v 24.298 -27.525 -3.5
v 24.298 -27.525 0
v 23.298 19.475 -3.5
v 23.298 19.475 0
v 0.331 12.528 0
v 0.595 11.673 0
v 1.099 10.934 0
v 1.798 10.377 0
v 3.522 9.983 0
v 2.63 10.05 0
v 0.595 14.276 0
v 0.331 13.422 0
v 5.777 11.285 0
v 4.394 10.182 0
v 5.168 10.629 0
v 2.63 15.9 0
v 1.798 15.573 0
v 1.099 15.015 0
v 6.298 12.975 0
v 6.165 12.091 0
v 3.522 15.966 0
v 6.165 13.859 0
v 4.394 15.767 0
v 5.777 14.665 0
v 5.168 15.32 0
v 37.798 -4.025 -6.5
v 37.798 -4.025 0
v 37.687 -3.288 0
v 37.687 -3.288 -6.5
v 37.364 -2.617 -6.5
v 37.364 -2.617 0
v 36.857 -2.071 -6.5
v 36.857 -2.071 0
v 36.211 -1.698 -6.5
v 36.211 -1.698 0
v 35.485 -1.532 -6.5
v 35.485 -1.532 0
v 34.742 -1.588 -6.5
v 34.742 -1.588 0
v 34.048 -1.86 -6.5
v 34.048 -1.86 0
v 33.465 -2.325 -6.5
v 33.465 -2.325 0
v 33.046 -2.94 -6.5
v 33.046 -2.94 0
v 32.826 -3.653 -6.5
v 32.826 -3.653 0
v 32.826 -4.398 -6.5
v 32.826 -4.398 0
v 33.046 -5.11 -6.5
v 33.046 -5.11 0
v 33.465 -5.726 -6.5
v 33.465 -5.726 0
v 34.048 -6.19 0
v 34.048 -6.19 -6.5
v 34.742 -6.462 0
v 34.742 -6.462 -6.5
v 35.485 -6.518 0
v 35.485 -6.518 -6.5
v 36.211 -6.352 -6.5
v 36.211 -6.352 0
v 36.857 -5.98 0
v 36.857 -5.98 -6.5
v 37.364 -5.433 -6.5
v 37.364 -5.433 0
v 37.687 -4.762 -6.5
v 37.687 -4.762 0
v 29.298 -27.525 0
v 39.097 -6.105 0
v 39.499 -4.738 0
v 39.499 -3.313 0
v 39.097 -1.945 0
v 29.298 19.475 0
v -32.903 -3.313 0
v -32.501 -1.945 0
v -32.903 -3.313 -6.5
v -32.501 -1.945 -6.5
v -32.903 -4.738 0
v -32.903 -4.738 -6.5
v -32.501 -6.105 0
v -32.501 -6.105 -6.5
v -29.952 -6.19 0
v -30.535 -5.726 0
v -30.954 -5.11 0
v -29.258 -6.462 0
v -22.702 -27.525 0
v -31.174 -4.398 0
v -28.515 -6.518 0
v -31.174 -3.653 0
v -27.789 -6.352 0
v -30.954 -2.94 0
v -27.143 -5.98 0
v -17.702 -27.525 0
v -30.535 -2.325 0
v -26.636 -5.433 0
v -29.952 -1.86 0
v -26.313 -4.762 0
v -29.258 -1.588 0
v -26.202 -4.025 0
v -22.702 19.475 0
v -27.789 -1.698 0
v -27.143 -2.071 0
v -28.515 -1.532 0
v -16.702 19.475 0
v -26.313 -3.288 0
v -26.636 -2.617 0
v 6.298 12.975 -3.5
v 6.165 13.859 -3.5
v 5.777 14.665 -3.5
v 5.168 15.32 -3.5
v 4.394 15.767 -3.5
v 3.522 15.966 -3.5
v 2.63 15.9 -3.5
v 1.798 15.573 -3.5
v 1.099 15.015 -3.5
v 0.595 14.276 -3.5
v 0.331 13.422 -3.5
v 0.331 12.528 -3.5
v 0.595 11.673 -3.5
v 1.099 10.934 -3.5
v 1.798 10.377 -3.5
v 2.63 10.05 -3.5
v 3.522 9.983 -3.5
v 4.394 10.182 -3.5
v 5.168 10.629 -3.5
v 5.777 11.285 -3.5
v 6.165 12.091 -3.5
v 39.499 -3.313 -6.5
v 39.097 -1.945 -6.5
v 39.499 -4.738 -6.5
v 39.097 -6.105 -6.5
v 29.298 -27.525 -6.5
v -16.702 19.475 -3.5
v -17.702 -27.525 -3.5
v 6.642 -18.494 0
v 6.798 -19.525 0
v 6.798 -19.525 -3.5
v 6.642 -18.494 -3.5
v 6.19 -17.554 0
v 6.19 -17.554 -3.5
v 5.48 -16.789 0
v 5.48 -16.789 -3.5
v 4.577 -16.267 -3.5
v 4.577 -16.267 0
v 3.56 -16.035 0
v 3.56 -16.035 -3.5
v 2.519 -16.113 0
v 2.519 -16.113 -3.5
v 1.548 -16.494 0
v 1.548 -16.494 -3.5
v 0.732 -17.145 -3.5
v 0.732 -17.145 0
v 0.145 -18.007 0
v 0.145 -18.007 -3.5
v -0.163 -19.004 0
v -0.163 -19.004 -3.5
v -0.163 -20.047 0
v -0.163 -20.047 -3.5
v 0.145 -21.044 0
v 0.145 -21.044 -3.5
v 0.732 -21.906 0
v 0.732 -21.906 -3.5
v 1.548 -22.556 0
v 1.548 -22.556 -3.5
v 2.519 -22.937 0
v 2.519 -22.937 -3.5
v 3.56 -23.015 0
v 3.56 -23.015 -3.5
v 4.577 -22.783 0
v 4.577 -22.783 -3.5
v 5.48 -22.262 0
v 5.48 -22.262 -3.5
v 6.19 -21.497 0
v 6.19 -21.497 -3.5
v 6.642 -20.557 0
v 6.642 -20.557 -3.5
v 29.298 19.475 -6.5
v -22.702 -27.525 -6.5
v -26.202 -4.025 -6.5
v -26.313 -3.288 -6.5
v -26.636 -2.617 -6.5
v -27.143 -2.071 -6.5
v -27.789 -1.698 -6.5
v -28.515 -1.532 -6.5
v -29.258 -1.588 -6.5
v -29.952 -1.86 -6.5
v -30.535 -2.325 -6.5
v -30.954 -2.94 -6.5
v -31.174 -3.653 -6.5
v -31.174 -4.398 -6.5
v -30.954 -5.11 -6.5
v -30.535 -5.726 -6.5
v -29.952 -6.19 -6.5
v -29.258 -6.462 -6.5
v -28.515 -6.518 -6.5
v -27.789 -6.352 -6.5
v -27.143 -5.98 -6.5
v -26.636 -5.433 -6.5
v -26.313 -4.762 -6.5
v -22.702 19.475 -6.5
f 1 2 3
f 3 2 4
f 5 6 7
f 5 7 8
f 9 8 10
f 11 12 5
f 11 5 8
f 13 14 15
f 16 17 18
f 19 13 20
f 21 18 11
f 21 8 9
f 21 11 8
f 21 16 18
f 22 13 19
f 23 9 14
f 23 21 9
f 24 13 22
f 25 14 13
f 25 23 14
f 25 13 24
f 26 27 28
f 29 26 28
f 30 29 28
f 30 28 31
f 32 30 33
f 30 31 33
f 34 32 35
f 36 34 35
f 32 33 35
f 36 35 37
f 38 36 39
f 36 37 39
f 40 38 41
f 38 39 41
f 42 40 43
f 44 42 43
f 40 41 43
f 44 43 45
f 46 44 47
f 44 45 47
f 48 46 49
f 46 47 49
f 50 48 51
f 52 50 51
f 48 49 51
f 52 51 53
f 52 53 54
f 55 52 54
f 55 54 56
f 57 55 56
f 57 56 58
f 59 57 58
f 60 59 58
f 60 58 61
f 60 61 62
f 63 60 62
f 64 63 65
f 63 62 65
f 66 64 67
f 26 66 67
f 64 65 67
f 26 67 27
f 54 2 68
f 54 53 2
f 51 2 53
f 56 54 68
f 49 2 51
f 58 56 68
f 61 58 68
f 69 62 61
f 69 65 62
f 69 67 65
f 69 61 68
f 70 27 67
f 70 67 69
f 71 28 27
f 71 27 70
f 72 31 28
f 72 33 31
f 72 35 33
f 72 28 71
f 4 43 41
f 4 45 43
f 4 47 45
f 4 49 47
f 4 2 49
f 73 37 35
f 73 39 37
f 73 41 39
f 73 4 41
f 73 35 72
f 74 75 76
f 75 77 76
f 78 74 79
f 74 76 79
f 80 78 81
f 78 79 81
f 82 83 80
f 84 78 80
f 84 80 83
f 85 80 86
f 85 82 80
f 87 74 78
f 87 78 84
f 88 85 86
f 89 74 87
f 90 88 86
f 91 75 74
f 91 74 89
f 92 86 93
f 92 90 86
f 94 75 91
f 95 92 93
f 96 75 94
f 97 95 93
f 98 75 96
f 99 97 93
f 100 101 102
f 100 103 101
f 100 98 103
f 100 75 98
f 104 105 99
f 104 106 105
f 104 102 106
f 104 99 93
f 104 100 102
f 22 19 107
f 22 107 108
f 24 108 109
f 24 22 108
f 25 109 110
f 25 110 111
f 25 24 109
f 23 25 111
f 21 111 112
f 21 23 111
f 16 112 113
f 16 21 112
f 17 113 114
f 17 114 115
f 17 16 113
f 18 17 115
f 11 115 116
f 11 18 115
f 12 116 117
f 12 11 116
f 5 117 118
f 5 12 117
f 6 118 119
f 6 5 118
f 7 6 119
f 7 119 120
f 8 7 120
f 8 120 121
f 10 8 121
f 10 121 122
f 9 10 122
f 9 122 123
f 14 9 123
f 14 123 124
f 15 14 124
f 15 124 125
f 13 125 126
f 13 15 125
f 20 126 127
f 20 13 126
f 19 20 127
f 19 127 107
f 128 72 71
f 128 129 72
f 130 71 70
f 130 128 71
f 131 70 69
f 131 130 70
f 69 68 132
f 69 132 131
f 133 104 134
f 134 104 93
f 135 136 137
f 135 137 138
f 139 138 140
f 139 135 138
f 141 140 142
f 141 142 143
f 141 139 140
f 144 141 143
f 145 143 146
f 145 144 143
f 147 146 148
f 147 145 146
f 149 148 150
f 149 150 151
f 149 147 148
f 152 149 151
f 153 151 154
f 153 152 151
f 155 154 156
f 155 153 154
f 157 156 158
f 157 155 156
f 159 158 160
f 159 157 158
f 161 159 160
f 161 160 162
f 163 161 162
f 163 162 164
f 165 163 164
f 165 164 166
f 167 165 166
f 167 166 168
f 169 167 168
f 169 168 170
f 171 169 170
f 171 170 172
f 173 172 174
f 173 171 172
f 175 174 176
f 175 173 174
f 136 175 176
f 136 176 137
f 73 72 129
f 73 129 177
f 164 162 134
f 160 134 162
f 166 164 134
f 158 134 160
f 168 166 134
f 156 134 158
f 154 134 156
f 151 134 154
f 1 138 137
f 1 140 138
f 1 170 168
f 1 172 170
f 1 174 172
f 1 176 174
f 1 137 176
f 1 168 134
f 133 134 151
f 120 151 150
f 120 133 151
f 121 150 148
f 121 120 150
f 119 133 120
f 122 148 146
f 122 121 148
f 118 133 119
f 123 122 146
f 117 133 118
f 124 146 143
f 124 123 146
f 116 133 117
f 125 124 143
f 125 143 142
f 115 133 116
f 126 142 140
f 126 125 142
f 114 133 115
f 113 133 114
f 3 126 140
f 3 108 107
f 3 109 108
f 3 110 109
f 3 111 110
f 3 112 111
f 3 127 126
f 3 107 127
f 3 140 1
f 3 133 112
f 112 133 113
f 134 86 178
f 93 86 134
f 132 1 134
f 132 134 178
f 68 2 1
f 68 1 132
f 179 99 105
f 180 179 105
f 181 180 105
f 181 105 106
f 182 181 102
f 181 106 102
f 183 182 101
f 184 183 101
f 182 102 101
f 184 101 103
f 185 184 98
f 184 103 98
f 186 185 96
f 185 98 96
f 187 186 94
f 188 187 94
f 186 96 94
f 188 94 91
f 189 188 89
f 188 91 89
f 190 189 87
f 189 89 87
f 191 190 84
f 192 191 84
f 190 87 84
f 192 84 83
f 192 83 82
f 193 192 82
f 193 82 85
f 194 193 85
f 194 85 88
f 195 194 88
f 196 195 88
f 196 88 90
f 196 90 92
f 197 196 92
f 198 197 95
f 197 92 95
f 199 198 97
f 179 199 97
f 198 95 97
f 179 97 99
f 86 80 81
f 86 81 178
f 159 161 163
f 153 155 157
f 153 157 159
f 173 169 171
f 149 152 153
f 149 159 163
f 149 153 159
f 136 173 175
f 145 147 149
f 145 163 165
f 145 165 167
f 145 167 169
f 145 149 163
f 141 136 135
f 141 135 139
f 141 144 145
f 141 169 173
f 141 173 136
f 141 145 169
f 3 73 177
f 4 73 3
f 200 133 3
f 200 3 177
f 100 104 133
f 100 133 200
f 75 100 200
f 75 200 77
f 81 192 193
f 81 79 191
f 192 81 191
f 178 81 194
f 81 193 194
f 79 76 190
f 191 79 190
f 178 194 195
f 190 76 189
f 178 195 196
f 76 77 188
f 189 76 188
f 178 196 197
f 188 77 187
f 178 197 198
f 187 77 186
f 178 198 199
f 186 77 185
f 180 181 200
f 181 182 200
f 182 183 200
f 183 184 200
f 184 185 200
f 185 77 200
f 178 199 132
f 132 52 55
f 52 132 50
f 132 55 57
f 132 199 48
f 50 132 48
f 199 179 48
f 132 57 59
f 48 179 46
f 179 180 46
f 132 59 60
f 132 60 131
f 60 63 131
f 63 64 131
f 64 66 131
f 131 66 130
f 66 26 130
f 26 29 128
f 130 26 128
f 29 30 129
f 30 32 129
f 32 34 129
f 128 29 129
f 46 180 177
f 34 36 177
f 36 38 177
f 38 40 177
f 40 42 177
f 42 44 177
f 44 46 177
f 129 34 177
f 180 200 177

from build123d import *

# Parameters (mm, degrees)
F0_R     = 2.5
F0_R_2   = 3.5
F0_R_3   = 3
F1_DEPTH = 6.5
F2_DEPTH = 3.5
F3_R     = 5


with BuildPart() as f1:
    # F0 (on Top) → F1 (new body)
    with BuildSketch(Plane.XY):
        Polygon((-16.702011, 19.474821), (-22.702011, 19.474821), (-33.452011, -4.025179), (-22.702011, -27.525179), (-17.702011, -27.525179), align=None)
        with Locations((-28.702011, -4.025179)):
            Circle(F0_R, mode=Mode.SUBTRACT)
        Polygon((23.297989, 19.474821), (-16.702011, 19.474821), (-17.702011, -27.525179), (24.297989, -27.525179), align=None)
        with Locations((3.297989, -19.525179)):
            Circle(F0_R_2, mode=Mode.SUBTRACT)
        with Locations((3.297989, 12.974821)):
            Circle(F0_R_3, mode=Mode.SUBTRACT)
        Polygon((29.297989, 19.474821), (23.297989, 19.474821), (24.297989, -27.525179), (29.297989, -27.525179), (40.047989, -4.025179), align=None)
        with Locations((35.297989, -4.025179)):
            Circle(F0_R, mode=Mode.SUBTRACT)
        with Locations((3.297989, 12.974821)):
            Circle(F0_R_3)
        with Locations((3.297989, -19.525179)):
            Circle(F0_R_2)
    extrude(amount=-F1_DEPTH)

    # F0 (on Top) → F2 (cut)
    with BuildSketch(Plane.XY):
        Polygon((23.297989, 19.474821), (-16.702011, 19.474821), (-17.702011, -27.525179), (24.297989, -27.525179), align=None)
        with Locations((3.297989, -19.525179)):
            Circle(F0_R_2, mode=Mode.SUBTRACT)
        with Locations((3.297989, 12.974821)):
            Circle(F0_R_3, mode=Mode.SUBTRACT)
    extrude(amount=-F2_DEPTH, mode=Mode.SUBTRACT)

    # F3
    f3_edges = [f1.edges().sort_by_distance(p)[0] for p in [
        (-33.452011, -4.025179, -3.25),
        (40.047989, -4.025179, -3.25),
    ]]
    fillet(f3_edges, radius=F3_R)


solid = f1.part
